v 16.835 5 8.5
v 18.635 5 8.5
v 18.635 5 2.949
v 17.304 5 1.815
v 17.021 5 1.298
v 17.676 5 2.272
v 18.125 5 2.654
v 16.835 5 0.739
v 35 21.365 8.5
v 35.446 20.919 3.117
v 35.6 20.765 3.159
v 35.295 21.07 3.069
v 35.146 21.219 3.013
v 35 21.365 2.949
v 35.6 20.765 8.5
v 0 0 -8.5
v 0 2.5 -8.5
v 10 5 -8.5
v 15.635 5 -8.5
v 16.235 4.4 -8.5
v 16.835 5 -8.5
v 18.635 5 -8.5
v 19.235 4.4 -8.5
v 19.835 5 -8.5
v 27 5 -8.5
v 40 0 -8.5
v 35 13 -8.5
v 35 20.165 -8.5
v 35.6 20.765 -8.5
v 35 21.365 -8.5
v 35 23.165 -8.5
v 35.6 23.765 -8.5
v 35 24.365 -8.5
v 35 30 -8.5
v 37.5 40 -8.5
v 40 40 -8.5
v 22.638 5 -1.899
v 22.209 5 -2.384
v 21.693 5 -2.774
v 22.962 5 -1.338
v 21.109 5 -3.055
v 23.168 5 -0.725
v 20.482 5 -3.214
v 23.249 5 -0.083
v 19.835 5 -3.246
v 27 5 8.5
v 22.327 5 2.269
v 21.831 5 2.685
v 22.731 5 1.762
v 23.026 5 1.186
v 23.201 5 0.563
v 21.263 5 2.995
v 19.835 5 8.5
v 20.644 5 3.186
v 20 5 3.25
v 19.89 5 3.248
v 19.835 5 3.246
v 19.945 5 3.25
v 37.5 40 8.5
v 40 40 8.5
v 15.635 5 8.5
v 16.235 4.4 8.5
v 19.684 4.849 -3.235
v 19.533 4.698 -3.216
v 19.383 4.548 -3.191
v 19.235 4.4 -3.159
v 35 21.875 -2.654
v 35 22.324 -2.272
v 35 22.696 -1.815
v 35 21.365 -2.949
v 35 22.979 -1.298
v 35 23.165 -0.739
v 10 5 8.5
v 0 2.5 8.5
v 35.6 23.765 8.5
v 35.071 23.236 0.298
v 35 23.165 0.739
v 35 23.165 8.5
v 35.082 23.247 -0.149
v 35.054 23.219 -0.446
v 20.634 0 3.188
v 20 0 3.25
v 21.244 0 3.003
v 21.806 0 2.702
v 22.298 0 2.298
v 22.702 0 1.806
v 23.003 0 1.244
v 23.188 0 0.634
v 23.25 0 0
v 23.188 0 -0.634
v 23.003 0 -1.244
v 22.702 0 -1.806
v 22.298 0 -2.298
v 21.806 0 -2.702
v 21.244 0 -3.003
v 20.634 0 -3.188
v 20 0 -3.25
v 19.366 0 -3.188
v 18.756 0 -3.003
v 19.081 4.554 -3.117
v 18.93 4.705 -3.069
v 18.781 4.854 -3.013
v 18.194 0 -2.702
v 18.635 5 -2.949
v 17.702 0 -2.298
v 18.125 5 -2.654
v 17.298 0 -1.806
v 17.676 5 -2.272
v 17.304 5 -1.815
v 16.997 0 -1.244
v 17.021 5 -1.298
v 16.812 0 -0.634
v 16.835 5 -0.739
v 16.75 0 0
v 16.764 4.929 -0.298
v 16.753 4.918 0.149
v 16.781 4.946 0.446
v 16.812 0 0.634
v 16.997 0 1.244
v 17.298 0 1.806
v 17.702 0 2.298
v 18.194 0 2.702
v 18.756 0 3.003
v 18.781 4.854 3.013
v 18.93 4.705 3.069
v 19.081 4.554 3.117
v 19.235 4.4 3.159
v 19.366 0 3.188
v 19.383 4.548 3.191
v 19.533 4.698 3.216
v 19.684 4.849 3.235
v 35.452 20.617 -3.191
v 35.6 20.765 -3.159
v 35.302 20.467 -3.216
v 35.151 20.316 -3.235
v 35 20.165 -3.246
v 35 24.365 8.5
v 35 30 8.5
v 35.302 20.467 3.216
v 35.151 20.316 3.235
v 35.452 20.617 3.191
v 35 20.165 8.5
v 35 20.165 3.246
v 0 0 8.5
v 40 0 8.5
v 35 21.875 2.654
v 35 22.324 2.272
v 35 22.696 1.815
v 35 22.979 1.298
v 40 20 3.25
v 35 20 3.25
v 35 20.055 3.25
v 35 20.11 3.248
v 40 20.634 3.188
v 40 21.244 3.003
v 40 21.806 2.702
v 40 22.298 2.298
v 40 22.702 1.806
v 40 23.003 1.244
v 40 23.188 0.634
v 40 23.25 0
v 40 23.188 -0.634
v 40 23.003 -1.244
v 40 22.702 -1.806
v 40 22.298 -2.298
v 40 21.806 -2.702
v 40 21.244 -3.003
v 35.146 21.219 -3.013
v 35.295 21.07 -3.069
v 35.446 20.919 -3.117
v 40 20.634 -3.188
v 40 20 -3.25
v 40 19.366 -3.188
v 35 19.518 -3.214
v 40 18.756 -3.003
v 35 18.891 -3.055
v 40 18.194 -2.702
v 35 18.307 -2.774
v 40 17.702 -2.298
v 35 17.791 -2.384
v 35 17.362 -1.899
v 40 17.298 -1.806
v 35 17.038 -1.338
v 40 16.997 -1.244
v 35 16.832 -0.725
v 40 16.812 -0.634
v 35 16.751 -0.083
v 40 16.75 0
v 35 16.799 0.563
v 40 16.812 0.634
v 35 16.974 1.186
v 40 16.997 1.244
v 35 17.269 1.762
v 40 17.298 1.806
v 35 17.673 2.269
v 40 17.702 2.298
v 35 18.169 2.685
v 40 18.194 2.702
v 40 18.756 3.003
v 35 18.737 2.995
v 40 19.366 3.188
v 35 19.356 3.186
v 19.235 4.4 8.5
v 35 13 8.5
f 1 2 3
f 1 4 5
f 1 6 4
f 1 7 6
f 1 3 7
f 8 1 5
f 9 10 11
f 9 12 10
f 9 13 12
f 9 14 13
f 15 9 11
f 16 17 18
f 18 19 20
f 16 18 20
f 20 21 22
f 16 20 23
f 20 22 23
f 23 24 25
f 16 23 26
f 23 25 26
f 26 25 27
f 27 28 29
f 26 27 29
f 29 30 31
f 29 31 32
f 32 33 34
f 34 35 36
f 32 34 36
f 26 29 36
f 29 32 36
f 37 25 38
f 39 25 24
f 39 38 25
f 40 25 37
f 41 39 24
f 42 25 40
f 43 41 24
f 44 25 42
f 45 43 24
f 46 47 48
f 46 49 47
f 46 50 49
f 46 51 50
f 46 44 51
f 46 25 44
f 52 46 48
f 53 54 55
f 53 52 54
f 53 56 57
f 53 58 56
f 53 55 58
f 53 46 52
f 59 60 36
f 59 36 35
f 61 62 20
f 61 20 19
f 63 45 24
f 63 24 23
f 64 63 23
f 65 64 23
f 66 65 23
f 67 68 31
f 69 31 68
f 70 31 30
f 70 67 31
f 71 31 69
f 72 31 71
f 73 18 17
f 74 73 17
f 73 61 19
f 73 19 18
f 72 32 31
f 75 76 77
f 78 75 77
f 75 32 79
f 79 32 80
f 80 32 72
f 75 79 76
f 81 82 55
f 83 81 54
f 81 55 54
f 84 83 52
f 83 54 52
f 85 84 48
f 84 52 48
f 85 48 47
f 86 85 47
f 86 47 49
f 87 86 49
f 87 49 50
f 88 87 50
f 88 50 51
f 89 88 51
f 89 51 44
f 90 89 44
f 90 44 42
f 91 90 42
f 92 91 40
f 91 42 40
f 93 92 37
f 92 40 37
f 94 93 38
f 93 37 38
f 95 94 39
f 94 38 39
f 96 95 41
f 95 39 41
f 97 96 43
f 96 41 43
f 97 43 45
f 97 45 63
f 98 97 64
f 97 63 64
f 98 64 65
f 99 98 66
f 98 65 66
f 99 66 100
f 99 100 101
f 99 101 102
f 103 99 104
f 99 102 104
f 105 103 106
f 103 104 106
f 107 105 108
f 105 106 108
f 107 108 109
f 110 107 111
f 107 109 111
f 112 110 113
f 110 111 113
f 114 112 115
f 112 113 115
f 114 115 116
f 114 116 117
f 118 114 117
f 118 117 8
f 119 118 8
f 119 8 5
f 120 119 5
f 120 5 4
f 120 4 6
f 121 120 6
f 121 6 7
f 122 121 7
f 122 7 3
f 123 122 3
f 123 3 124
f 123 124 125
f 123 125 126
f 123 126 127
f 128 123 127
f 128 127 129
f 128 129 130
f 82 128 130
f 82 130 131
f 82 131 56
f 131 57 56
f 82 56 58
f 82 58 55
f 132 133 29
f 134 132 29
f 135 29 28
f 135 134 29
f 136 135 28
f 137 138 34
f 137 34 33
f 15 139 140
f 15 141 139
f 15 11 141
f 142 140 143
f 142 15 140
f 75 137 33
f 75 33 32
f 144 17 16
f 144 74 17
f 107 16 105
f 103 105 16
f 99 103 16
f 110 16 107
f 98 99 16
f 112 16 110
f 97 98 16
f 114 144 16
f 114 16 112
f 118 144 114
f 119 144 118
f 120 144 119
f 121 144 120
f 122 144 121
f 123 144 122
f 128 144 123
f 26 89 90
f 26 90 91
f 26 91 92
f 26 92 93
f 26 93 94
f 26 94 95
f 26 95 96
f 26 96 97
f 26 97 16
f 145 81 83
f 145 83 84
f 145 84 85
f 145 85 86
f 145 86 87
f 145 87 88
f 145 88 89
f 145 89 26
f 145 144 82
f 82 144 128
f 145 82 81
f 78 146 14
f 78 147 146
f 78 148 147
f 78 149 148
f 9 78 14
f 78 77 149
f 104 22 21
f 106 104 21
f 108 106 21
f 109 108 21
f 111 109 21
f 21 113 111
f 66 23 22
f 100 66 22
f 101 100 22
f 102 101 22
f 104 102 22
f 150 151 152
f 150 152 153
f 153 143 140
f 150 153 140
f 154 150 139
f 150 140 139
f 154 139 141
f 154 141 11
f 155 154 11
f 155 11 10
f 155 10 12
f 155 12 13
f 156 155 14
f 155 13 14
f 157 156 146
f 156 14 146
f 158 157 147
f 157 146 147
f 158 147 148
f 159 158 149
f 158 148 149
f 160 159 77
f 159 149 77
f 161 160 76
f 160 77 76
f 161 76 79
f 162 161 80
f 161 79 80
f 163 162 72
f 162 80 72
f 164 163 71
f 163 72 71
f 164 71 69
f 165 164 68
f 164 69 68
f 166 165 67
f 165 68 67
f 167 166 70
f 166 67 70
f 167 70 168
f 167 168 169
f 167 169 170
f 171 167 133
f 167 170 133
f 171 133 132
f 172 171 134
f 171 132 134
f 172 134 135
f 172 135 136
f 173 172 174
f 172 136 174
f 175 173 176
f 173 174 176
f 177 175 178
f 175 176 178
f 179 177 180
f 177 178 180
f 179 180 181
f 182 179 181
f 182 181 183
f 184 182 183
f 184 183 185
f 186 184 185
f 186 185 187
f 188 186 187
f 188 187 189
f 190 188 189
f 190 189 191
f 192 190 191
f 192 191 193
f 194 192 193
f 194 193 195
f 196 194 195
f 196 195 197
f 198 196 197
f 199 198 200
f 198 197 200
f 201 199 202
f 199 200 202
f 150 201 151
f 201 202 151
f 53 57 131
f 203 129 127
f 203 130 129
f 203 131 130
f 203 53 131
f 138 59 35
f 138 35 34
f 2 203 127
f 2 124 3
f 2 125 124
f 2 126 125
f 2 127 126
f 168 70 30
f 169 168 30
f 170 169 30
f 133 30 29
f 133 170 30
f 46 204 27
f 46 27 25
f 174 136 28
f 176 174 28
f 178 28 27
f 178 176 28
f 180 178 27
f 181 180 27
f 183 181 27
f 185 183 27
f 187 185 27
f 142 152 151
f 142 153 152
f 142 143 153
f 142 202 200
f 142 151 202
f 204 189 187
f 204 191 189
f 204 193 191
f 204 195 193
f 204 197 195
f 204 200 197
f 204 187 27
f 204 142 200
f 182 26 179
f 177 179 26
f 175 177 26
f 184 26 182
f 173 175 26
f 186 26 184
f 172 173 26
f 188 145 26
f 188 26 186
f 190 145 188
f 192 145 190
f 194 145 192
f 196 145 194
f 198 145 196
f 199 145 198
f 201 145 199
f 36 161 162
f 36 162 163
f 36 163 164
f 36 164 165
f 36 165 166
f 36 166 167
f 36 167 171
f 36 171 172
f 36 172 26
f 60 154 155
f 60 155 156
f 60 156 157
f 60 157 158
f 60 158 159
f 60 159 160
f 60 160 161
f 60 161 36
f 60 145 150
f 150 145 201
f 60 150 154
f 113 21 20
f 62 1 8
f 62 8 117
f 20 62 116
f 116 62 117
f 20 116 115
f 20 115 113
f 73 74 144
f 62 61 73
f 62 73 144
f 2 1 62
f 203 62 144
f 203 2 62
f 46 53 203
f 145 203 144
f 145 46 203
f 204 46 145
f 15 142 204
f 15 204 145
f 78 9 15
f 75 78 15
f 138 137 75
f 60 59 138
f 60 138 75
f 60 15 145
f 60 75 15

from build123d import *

# Parameters (mm, degrees)
EXTRUDE_1_DEPTH     = 8.5
SKETCH_3_R          = 3.25
CUT_EXTRUDE_1_DEPTH = 54.826108906
SKETCH_4_R          = 3.25
CUT_EXTRUDE_2_DEPTH = 54.826108906


with BuildPart() as part:
    # 草图1 → 凸台-拉伸1 (new, symmetric)
    with BuildSketch(Plane.XY):
        Polygon((0, 0), (40, 0), (40, 40), (37.5, 40), (35, 30), (35, 24.364950833), (35.6, 23.764950833), (35, 23.164950833), (35, 21.364950833), (35.6, 20.764950833), (35, 20.164950833), (35, 13), (27, 5), (19.835049167, 5), (19.235049167, 4.4), (18.635049167, 5), (16.835049167, 5), (16.235049167, 4.4), (15.635049167, 5), (10, 5), (0, 2.5), align=None)
    extrude(amount=EXTRUDE_1_DEPTH, both=True)

    # 草图3 → 切除-拉伸1 (cut, through all)
    with BuildSketch(Plane(origin=(0, 5, 0), x_dir=(1, 0, 0), z_dir=(0, 1, 0))):
        with Locations(Location((20, 0, 0), (0, 0, 270))):
            Circle(SKETCH_3_R)
    extrude(amount=-CUT_EXTRUDE_1_DEPTH, mode=Mode.SUBTRACT)

    # 草图4 → 切除-拉伸2 (cut, through all)
    with BuildSketch(Plane.ZY.offset(-35)):
        with Locations((0, 20)):
            Circle(SKETCH_4_R)
    extrude(amount=-CUT_EXTRUDE_2_DEPTH, mode=Mode.SUBTRACT)


solid = part.part
